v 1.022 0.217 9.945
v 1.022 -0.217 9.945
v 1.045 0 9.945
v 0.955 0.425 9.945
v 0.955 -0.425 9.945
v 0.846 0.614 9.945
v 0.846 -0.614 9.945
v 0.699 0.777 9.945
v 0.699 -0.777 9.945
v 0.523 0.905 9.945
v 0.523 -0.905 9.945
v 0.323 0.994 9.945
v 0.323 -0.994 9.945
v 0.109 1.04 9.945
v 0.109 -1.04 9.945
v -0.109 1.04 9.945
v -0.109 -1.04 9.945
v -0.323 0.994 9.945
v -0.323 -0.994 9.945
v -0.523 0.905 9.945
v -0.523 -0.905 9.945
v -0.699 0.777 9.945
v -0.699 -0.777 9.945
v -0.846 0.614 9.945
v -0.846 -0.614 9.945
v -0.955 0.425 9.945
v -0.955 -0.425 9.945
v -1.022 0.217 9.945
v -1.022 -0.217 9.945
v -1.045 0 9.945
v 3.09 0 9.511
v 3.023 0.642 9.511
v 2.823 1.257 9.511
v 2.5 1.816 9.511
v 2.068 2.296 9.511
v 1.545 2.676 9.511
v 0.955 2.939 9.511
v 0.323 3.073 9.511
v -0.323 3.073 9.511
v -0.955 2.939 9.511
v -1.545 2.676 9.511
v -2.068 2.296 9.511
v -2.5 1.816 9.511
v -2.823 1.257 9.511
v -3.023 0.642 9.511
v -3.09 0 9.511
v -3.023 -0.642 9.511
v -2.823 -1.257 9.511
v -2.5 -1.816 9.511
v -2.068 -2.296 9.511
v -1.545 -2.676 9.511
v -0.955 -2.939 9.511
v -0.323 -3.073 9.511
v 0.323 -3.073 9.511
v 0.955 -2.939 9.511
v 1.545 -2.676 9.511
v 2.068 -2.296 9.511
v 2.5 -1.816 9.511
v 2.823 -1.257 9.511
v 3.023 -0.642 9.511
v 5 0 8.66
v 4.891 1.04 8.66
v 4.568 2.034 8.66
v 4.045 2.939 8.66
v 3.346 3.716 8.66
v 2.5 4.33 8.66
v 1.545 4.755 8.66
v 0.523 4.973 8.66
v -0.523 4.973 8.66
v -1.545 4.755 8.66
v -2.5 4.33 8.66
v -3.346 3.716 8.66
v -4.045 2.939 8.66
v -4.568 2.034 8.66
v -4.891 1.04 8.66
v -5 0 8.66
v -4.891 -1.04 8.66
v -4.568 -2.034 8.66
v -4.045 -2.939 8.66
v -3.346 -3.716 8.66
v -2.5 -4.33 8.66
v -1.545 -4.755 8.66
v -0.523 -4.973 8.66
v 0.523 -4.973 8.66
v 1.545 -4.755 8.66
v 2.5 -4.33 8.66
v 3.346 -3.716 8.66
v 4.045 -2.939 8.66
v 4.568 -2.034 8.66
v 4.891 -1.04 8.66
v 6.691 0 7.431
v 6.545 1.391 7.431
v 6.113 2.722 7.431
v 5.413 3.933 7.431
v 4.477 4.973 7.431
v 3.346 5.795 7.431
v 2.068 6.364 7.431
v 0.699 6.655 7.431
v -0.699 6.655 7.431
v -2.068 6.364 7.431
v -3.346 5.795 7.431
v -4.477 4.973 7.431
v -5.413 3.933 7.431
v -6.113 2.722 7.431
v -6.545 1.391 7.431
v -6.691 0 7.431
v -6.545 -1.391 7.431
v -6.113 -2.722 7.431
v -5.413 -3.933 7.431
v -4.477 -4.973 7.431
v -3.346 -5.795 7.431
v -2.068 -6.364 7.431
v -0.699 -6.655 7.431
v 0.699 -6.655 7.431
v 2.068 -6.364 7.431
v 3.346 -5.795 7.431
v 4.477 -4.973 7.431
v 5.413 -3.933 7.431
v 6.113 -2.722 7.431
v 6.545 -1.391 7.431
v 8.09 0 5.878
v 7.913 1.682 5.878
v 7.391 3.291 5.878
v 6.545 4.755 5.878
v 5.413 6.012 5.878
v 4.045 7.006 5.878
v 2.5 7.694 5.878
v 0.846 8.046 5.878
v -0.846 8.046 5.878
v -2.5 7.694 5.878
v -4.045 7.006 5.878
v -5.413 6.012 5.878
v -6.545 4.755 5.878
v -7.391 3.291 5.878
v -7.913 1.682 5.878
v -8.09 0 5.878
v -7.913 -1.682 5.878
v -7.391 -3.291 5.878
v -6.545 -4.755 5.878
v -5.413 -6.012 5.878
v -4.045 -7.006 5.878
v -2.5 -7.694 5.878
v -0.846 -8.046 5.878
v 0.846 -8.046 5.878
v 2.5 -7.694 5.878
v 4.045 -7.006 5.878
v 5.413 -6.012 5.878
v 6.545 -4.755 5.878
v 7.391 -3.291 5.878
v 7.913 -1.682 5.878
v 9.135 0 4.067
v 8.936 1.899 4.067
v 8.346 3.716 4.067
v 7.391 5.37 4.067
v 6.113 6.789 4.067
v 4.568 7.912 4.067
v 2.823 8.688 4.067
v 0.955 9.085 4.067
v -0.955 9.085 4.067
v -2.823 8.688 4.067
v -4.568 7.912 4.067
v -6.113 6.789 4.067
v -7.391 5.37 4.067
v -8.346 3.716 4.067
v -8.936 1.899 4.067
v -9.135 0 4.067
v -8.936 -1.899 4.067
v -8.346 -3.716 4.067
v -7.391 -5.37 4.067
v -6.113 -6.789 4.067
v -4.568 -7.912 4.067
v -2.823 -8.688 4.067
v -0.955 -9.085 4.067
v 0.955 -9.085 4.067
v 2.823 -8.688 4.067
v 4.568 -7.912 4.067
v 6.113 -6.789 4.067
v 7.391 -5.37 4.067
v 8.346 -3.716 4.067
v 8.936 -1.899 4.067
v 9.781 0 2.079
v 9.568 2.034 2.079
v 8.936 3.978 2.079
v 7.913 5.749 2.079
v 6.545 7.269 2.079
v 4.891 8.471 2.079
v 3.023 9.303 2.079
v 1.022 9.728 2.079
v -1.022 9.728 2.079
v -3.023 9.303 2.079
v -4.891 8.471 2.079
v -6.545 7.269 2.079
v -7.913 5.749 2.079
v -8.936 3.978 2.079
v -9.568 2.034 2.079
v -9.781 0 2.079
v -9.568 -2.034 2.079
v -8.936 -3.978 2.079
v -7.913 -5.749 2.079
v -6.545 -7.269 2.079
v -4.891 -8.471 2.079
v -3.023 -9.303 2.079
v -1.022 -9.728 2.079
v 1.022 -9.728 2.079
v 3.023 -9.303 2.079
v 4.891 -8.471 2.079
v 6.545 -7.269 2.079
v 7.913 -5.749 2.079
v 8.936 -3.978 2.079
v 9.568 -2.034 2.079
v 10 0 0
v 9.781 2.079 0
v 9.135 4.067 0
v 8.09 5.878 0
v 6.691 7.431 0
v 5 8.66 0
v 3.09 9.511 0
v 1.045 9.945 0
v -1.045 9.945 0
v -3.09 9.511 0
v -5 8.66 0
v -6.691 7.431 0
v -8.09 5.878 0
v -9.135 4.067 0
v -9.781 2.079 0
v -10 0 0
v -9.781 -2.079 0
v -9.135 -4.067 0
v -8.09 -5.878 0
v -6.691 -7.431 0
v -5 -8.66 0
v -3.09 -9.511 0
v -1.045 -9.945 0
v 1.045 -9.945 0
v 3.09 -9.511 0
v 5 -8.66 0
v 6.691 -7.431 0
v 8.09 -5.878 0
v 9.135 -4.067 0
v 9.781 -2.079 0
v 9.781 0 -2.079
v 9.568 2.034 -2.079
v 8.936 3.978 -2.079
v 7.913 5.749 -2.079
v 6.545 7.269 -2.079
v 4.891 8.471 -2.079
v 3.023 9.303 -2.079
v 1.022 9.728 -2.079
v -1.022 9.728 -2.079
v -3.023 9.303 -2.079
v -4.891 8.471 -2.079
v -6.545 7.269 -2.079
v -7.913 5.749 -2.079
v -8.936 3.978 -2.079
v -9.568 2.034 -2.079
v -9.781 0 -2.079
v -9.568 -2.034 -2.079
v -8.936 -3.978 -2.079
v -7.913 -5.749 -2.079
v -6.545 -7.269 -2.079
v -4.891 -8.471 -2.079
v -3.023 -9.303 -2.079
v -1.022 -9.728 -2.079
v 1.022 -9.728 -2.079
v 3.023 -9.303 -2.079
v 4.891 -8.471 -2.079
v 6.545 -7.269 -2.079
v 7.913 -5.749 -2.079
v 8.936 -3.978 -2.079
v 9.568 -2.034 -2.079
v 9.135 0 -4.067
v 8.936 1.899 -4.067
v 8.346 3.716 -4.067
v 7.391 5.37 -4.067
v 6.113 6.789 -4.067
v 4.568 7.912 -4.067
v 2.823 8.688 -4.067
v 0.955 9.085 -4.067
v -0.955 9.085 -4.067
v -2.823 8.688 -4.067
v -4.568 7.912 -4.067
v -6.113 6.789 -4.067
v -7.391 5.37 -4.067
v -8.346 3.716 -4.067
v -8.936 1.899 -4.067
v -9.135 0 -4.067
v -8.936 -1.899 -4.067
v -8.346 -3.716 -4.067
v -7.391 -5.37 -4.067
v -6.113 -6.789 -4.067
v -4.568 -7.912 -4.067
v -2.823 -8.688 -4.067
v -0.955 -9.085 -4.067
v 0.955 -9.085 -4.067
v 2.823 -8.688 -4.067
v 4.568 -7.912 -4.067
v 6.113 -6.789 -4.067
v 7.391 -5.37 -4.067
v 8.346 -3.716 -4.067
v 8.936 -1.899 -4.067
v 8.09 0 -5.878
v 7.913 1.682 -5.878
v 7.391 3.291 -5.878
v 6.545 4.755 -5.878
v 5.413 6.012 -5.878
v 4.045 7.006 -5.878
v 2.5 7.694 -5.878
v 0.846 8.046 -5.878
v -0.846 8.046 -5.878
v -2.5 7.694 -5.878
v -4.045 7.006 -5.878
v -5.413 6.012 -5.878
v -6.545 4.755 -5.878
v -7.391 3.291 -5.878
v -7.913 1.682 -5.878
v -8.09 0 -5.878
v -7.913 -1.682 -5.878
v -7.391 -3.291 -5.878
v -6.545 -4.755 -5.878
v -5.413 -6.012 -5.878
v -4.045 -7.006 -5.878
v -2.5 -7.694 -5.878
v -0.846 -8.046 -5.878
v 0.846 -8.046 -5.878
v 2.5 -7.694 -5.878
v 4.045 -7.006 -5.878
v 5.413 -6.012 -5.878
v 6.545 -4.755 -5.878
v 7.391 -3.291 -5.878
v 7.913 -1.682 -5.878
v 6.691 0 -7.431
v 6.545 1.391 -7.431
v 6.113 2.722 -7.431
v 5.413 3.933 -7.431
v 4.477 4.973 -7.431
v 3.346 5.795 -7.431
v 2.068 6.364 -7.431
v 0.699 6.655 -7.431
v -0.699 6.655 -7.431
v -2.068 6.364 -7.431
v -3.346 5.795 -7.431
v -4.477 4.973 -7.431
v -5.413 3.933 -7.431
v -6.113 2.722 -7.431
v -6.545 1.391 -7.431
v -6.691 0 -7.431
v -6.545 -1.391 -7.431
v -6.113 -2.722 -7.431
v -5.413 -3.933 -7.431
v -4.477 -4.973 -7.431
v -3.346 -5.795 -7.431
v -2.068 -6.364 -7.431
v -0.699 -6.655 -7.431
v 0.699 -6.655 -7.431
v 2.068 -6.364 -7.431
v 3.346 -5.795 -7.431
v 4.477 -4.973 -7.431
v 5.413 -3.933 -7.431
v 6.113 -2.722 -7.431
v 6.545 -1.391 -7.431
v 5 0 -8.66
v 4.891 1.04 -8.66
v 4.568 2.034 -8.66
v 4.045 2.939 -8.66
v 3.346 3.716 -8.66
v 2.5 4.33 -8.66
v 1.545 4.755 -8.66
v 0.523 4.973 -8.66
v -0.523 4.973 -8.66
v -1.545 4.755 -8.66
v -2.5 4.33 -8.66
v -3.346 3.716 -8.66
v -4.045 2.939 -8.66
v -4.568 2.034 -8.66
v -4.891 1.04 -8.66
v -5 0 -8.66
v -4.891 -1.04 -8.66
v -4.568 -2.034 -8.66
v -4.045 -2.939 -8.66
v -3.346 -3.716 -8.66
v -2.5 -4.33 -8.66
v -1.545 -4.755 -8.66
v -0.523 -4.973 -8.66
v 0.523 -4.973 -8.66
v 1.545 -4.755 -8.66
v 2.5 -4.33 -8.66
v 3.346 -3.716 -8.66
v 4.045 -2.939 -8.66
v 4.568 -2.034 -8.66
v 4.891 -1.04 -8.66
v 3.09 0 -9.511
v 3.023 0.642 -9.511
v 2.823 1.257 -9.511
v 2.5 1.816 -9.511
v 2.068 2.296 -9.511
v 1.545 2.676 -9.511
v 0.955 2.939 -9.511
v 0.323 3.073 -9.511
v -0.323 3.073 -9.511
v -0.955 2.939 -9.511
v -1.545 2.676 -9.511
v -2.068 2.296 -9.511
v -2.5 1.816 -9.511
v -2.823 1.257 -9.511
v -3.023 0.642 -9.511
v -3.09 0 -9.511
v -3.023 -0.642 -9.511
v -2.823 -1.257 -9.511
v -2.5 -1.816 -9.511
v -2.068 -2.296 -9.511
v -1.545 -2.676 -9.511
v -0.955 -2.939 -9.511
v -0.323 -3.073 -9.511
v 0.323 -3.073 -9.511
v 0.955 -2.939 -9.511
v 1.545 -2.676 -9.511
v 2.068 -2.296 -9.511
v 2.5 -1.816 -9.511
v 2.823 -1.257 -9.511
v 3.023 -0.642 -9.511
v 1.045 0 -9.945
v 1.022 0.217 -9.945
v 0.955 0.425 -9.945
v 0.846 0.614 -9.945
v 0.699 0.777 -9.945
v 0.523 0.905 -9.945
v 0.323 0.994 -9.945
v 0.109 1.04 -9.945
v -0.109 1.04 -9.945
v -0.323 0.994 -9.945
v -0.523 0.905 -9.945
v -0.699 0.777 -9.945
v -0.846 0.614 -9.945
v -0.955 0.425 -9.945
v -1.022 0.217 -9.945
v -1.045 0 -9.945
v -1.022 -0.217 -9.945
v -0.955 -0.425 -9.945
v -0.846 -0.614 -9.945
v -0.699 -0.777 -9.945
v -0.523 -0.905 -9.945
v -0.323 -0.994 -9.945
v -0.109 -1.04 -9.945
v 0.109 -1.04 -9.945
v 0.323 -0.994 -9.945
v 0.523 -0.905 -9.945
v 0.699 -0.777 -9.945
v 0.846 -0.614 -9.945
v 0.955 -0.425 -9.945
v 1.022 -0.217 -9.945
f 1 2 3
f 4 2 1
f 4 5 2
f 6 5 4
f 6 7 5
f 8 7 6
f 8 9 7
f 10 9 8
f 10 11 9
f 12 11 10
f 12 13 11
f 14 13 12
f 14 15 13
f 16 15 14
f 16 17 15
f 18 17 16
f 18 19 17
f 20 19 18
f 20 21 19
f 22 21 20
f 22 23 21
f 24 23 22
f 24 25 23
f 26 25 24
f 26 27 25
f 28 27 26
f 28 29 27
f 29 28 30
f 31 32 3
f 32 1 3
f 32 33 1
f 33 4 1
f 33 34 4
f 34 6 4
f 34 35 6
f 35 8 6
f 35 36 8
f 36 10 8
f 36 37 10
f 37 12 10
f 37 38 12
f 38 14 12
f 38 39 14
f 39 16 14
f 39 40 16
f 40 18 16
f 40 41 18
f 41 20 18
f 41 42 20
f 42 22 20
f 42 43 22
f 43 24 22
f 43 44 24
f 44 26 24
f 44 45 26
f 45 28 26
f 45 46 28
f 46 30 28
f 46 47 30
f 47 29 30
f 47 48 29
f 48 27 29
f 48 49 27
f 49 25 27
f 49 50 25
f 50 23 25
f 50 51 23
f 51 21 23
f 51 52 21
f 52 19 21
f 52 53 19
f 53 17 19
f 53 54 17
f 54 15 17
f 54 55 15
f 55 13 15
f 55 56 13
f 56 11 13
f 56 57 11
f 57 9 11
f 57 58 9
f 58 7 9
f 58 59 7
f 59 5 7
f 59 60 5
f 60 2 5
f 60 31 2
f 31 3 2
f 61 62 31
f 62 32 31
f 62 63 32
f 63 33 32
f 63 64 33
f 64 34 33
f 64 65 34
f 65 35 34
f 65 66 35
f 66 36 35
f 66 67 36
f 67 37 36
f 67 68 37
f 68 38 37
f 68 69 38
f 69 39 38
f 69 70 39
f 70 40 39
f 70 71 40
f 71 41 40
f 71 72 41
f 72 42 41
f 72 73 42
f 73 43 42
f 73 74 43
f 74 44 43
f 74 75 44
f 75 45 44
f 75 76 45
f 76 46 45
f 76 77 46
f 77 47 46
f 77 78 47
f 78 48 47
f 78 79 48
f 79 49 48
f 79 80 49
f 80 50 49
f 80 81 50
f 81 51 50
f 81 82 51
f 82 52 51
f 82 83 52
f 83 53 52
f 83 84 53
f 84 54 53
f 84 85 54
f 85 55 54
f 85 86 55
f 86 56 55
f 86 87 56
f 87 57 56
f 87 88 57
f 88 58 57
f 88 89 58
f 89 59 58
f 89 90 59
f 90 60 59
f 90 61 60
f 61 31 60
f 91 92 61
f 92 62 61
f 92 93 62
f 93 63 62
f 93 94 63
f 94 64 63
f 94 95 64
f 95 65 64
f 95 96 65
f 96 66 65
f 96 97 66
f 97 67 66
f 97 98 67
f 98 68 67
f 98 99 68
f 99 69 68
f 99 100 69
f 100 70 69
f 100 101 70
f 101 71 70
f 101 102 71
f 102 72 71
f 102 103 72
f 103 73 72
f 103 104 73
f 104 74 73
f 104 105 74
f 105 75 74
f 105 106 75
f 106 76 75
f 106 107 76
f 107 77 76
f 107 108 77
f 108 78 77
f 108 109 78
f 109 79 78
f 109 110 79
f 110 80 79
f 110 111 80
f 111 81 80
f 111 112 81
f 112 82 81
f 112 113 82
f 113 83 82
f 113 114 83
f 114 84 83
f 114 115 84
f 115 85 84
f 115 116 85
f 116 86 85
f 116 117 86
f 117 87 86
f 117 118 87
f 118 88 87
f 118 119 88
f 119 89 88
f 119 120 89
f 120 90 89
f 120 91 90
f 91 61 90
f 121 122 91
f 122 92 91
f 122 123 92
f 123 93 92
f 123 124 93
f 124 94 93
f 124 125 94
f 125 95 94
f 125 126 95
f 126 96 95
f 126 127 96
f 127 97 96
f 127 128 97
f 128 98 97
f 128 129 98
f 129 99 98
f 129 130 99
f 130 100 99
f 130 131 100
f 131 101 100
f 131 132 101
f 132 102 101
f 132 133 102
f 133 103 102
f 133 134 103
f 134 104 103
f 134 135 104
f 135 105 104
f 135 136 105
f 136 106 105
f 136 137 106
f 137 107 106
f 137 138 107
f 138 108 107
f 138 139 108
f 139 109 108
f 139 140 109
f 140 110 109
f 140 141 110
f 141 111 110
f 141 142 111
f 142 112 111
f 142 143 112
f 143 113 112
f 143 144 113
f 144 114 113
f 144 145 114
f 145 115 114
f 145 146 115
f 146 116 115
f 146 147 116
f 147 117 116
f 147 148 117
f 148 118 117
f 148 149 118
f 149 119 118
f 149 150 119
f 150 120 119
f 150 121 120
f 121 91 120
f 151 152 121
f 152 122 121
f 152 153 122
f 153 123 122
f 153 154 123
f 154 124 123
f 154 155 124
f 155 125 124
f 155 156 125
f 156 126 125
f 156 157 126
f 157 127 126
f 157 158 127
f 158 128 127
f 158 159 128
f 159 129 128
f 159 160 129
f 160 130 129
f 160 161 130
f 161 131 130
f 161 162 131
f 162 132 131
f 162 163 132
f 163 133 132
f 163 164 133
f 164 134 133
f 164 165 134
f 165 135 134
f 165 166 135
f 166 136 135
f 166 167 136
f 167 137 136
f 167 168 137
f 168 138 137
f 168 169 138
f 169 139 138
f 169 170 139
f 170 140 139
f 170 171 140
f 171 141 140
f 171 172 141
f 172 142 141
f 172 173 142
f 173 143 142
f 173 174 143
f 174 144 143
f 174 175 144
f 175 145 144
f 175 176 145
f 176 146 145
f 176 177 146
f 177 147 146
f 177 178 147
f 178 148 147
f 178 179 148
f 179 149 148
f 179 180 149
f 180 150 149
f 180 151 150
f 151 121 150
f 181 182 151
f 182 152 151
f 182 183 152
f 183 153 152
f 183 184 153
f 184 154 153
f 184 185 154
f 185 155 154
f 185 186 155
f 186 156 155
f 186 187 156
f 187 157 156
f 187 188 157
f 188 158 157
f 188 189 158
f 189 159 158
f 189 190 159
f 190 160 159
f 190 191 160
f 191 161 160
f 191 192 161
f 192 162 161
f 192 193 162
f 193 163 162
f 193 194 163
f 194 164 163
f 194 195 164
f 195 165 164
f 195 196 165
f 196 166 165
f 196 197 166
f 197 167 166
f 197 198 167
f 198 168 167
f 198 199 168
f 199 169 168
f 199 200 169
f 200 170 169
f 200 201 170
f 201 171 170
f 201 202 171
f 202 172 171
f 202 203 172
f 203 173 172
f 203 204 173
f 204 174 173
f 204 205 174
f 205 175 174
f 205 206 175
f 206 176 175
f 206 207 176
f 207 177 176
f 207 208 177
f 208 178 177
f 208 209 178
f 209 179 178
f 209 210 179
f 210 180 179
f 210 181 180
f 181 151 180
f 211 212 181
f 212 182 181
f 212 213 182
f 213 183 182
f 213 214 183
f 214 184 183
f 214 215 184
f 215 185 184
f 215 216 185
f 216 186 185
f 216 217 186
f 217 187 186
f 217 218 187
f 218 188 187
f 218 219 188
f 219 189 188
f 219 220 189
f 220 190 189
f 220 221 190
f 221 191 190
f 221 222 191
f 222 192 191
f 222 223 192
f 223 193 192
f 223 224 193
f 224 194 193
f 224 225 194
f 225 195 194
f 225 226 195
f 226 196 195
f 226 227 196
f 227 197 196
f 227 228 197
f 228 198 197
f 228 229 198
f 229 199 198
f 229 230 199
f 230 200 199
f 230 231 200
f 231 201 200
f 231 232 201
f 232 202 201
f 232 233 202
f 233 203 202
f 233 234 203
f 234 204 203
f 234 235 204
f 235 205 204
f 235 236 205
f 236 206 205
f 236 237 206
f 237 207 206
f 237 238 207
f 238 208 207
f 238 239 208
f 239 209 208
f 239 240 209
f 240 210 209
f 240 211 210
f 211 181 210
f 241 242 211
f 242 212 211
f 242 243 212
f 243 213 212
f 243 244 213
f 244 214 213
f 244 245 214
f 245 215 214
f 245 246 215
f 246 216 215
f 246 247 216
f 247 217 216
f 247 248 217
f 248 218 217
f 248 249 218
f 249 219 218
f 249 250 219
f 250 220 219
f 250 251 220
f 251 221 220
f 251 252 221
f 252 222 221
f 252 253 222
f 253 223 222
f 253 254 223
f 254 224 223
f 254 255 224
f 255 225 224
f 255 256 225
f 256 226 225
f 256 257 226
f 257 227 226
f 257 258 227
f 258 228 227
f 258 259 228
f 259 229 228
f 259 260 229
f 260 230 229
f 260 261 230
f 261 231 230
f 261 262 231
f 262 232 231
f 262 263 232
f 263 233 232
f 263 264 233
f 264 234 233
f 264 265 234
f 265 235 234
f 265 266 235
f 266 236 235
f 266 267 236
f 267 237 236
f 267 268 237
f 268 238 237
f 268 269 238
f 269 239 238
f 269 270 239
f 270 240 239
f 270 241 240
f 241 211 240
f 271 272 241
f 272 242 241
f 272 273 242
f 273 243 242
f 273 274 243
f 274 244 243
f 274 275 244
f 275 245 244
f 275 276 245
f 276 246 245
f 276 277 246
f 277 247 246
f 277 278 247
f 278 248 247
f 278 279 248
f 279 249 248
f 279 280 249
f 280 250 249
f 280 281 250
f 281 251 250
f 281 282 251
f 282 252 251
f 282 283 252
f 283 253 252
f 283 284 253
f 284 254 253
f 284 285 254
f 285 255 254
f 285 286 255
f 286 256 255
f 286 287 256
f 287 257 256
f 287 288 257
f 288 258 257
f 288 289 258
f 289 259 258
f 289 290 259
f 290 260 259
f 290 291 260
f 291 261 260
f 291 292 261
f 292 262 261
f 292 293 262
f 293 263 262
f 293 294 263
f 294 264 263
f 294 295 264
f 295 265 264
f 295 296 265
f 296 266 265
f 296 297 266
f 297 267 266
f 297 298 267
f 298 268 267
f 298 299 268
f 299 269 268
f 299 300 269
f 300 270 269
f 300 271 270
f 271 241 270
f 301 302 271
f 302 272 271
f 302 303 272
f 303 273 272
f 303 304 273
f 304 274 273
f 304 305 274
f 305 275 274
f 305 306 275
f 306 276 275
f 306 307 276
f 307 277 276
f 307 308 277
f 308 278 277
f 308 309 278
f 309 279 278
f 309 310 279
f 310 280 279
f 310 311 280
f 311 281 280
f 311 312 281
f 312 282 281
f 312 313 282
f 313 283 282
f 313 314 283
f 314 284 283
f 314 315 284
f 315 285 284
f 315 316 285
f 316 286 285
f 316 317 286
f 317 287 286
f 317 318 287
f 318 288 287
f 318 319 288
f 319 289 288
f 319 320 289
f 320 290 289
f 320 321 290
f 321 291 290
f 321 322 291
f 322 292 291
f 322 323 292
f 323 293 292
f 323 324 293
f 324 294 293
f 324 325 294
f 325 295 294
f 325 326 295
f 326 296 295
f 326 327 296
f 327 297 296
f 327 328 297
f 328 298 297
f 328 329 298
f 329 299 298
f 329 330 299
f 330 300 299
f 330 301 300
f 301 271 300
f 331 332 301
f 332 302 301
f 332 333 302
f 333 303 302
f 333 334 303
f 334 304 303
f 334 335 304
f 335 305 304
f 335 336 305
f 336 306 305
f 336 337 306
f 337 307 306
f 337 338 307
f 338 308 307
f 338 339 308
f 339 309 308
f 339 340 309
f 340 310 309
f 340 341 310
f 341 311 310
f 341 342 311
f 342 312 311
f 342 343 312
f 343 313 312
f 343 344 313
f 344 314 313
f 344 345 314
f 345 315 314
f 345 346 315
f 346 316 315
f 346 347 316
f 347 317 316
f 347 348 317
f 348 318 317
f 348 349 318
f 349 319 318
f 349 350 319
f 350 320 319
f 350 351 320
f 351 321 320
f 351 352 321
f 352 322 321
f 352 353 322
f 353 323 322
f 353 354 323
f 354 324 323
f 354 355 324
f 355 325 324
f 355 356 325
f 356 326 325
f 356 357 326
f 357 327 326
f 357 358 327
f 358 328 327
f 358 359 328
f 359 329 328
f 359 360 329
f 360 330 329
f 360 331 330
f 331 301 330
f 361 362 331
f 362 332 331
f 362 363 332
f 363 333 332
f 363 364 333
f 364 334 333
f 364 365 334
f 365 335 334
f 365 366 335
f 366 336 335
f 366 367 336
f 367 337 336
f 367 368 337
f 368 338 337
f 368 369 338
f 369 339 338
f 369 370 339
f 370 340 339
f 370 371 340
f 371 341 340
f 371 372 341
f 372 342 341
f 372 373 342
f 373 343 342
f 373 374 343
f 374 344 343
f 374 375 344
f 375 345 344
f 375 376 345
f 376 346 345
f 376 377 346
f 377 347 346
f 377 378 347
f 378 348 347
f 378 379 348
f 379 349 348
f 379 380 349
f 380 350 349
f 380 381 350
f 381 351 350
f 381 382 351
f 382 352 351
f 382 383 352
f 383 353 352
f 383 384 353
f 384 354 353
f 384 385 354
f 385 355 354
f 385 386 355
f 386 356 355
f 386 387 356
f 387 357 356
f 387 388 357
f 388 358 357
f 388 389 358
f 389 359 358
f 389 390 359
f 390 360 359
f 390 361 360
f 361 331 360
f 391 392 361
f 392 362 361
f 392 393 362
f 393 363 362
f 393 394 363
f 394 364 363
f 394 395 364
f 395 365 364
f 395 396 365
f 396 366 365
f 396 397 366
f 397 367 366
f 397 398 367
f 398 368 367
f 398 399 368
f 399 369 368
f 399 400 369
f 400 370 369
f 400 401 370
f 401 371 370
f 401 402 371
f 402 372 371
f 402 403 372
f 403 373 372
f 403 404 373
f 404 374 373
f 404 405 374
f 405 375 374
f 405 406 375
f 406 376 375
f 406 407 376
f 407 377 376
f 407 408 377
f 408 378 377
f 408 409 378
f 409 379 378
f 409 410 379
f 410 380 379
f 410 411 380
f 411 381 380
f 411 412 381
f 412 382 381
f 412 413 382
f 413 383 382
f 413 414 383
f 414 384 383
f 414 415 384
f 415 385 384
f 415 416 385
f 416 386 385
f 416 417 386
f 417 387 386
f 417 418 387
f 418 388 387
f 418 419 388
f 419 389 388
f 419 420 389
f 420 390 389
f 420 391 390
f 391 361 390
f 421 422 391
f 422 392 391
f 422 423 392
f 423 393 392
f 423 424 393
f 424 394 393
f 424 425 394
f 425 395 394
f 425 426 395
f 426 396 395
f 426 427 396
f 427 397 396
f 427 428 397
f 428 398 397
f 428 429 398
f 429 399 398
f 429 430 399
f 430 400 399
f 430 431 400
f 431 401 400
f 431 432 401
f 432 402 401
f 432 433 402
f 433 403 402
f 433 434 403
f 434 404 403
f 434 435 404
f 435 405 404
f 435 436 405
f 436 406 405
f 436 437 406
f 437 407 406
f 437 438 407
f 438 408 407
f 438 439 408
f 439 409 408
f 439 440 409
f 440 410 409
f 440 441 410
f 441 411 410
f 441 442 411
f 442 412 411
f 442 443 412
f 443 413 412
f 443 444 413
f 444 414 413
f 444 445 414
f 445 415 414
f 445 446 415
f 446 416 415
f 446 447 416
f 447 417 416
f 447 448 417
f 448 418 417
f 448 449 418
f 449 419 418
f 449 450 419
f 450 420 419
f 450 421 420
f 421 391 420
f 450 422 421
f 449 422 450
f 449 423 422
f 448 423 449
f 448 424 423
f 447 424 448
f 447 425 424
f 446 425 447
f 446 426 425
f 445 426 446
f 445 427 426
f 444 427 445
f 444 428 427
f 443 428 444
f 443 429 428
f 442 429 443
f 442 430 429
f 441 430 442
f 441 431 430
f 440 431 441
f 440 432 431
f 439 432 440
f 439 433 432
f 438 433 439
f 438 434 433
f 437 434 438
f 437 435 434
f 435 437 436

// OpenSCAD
// E2E test fixture — deterministic local file served by the dev/prod server.
// Replaces the external GitHub URL in the "load a demo by url" e2e test so
// the suite has zero external network dependencies.
// Expected output: "Top level object is a 3D object (manifold):"
sphere(10);
